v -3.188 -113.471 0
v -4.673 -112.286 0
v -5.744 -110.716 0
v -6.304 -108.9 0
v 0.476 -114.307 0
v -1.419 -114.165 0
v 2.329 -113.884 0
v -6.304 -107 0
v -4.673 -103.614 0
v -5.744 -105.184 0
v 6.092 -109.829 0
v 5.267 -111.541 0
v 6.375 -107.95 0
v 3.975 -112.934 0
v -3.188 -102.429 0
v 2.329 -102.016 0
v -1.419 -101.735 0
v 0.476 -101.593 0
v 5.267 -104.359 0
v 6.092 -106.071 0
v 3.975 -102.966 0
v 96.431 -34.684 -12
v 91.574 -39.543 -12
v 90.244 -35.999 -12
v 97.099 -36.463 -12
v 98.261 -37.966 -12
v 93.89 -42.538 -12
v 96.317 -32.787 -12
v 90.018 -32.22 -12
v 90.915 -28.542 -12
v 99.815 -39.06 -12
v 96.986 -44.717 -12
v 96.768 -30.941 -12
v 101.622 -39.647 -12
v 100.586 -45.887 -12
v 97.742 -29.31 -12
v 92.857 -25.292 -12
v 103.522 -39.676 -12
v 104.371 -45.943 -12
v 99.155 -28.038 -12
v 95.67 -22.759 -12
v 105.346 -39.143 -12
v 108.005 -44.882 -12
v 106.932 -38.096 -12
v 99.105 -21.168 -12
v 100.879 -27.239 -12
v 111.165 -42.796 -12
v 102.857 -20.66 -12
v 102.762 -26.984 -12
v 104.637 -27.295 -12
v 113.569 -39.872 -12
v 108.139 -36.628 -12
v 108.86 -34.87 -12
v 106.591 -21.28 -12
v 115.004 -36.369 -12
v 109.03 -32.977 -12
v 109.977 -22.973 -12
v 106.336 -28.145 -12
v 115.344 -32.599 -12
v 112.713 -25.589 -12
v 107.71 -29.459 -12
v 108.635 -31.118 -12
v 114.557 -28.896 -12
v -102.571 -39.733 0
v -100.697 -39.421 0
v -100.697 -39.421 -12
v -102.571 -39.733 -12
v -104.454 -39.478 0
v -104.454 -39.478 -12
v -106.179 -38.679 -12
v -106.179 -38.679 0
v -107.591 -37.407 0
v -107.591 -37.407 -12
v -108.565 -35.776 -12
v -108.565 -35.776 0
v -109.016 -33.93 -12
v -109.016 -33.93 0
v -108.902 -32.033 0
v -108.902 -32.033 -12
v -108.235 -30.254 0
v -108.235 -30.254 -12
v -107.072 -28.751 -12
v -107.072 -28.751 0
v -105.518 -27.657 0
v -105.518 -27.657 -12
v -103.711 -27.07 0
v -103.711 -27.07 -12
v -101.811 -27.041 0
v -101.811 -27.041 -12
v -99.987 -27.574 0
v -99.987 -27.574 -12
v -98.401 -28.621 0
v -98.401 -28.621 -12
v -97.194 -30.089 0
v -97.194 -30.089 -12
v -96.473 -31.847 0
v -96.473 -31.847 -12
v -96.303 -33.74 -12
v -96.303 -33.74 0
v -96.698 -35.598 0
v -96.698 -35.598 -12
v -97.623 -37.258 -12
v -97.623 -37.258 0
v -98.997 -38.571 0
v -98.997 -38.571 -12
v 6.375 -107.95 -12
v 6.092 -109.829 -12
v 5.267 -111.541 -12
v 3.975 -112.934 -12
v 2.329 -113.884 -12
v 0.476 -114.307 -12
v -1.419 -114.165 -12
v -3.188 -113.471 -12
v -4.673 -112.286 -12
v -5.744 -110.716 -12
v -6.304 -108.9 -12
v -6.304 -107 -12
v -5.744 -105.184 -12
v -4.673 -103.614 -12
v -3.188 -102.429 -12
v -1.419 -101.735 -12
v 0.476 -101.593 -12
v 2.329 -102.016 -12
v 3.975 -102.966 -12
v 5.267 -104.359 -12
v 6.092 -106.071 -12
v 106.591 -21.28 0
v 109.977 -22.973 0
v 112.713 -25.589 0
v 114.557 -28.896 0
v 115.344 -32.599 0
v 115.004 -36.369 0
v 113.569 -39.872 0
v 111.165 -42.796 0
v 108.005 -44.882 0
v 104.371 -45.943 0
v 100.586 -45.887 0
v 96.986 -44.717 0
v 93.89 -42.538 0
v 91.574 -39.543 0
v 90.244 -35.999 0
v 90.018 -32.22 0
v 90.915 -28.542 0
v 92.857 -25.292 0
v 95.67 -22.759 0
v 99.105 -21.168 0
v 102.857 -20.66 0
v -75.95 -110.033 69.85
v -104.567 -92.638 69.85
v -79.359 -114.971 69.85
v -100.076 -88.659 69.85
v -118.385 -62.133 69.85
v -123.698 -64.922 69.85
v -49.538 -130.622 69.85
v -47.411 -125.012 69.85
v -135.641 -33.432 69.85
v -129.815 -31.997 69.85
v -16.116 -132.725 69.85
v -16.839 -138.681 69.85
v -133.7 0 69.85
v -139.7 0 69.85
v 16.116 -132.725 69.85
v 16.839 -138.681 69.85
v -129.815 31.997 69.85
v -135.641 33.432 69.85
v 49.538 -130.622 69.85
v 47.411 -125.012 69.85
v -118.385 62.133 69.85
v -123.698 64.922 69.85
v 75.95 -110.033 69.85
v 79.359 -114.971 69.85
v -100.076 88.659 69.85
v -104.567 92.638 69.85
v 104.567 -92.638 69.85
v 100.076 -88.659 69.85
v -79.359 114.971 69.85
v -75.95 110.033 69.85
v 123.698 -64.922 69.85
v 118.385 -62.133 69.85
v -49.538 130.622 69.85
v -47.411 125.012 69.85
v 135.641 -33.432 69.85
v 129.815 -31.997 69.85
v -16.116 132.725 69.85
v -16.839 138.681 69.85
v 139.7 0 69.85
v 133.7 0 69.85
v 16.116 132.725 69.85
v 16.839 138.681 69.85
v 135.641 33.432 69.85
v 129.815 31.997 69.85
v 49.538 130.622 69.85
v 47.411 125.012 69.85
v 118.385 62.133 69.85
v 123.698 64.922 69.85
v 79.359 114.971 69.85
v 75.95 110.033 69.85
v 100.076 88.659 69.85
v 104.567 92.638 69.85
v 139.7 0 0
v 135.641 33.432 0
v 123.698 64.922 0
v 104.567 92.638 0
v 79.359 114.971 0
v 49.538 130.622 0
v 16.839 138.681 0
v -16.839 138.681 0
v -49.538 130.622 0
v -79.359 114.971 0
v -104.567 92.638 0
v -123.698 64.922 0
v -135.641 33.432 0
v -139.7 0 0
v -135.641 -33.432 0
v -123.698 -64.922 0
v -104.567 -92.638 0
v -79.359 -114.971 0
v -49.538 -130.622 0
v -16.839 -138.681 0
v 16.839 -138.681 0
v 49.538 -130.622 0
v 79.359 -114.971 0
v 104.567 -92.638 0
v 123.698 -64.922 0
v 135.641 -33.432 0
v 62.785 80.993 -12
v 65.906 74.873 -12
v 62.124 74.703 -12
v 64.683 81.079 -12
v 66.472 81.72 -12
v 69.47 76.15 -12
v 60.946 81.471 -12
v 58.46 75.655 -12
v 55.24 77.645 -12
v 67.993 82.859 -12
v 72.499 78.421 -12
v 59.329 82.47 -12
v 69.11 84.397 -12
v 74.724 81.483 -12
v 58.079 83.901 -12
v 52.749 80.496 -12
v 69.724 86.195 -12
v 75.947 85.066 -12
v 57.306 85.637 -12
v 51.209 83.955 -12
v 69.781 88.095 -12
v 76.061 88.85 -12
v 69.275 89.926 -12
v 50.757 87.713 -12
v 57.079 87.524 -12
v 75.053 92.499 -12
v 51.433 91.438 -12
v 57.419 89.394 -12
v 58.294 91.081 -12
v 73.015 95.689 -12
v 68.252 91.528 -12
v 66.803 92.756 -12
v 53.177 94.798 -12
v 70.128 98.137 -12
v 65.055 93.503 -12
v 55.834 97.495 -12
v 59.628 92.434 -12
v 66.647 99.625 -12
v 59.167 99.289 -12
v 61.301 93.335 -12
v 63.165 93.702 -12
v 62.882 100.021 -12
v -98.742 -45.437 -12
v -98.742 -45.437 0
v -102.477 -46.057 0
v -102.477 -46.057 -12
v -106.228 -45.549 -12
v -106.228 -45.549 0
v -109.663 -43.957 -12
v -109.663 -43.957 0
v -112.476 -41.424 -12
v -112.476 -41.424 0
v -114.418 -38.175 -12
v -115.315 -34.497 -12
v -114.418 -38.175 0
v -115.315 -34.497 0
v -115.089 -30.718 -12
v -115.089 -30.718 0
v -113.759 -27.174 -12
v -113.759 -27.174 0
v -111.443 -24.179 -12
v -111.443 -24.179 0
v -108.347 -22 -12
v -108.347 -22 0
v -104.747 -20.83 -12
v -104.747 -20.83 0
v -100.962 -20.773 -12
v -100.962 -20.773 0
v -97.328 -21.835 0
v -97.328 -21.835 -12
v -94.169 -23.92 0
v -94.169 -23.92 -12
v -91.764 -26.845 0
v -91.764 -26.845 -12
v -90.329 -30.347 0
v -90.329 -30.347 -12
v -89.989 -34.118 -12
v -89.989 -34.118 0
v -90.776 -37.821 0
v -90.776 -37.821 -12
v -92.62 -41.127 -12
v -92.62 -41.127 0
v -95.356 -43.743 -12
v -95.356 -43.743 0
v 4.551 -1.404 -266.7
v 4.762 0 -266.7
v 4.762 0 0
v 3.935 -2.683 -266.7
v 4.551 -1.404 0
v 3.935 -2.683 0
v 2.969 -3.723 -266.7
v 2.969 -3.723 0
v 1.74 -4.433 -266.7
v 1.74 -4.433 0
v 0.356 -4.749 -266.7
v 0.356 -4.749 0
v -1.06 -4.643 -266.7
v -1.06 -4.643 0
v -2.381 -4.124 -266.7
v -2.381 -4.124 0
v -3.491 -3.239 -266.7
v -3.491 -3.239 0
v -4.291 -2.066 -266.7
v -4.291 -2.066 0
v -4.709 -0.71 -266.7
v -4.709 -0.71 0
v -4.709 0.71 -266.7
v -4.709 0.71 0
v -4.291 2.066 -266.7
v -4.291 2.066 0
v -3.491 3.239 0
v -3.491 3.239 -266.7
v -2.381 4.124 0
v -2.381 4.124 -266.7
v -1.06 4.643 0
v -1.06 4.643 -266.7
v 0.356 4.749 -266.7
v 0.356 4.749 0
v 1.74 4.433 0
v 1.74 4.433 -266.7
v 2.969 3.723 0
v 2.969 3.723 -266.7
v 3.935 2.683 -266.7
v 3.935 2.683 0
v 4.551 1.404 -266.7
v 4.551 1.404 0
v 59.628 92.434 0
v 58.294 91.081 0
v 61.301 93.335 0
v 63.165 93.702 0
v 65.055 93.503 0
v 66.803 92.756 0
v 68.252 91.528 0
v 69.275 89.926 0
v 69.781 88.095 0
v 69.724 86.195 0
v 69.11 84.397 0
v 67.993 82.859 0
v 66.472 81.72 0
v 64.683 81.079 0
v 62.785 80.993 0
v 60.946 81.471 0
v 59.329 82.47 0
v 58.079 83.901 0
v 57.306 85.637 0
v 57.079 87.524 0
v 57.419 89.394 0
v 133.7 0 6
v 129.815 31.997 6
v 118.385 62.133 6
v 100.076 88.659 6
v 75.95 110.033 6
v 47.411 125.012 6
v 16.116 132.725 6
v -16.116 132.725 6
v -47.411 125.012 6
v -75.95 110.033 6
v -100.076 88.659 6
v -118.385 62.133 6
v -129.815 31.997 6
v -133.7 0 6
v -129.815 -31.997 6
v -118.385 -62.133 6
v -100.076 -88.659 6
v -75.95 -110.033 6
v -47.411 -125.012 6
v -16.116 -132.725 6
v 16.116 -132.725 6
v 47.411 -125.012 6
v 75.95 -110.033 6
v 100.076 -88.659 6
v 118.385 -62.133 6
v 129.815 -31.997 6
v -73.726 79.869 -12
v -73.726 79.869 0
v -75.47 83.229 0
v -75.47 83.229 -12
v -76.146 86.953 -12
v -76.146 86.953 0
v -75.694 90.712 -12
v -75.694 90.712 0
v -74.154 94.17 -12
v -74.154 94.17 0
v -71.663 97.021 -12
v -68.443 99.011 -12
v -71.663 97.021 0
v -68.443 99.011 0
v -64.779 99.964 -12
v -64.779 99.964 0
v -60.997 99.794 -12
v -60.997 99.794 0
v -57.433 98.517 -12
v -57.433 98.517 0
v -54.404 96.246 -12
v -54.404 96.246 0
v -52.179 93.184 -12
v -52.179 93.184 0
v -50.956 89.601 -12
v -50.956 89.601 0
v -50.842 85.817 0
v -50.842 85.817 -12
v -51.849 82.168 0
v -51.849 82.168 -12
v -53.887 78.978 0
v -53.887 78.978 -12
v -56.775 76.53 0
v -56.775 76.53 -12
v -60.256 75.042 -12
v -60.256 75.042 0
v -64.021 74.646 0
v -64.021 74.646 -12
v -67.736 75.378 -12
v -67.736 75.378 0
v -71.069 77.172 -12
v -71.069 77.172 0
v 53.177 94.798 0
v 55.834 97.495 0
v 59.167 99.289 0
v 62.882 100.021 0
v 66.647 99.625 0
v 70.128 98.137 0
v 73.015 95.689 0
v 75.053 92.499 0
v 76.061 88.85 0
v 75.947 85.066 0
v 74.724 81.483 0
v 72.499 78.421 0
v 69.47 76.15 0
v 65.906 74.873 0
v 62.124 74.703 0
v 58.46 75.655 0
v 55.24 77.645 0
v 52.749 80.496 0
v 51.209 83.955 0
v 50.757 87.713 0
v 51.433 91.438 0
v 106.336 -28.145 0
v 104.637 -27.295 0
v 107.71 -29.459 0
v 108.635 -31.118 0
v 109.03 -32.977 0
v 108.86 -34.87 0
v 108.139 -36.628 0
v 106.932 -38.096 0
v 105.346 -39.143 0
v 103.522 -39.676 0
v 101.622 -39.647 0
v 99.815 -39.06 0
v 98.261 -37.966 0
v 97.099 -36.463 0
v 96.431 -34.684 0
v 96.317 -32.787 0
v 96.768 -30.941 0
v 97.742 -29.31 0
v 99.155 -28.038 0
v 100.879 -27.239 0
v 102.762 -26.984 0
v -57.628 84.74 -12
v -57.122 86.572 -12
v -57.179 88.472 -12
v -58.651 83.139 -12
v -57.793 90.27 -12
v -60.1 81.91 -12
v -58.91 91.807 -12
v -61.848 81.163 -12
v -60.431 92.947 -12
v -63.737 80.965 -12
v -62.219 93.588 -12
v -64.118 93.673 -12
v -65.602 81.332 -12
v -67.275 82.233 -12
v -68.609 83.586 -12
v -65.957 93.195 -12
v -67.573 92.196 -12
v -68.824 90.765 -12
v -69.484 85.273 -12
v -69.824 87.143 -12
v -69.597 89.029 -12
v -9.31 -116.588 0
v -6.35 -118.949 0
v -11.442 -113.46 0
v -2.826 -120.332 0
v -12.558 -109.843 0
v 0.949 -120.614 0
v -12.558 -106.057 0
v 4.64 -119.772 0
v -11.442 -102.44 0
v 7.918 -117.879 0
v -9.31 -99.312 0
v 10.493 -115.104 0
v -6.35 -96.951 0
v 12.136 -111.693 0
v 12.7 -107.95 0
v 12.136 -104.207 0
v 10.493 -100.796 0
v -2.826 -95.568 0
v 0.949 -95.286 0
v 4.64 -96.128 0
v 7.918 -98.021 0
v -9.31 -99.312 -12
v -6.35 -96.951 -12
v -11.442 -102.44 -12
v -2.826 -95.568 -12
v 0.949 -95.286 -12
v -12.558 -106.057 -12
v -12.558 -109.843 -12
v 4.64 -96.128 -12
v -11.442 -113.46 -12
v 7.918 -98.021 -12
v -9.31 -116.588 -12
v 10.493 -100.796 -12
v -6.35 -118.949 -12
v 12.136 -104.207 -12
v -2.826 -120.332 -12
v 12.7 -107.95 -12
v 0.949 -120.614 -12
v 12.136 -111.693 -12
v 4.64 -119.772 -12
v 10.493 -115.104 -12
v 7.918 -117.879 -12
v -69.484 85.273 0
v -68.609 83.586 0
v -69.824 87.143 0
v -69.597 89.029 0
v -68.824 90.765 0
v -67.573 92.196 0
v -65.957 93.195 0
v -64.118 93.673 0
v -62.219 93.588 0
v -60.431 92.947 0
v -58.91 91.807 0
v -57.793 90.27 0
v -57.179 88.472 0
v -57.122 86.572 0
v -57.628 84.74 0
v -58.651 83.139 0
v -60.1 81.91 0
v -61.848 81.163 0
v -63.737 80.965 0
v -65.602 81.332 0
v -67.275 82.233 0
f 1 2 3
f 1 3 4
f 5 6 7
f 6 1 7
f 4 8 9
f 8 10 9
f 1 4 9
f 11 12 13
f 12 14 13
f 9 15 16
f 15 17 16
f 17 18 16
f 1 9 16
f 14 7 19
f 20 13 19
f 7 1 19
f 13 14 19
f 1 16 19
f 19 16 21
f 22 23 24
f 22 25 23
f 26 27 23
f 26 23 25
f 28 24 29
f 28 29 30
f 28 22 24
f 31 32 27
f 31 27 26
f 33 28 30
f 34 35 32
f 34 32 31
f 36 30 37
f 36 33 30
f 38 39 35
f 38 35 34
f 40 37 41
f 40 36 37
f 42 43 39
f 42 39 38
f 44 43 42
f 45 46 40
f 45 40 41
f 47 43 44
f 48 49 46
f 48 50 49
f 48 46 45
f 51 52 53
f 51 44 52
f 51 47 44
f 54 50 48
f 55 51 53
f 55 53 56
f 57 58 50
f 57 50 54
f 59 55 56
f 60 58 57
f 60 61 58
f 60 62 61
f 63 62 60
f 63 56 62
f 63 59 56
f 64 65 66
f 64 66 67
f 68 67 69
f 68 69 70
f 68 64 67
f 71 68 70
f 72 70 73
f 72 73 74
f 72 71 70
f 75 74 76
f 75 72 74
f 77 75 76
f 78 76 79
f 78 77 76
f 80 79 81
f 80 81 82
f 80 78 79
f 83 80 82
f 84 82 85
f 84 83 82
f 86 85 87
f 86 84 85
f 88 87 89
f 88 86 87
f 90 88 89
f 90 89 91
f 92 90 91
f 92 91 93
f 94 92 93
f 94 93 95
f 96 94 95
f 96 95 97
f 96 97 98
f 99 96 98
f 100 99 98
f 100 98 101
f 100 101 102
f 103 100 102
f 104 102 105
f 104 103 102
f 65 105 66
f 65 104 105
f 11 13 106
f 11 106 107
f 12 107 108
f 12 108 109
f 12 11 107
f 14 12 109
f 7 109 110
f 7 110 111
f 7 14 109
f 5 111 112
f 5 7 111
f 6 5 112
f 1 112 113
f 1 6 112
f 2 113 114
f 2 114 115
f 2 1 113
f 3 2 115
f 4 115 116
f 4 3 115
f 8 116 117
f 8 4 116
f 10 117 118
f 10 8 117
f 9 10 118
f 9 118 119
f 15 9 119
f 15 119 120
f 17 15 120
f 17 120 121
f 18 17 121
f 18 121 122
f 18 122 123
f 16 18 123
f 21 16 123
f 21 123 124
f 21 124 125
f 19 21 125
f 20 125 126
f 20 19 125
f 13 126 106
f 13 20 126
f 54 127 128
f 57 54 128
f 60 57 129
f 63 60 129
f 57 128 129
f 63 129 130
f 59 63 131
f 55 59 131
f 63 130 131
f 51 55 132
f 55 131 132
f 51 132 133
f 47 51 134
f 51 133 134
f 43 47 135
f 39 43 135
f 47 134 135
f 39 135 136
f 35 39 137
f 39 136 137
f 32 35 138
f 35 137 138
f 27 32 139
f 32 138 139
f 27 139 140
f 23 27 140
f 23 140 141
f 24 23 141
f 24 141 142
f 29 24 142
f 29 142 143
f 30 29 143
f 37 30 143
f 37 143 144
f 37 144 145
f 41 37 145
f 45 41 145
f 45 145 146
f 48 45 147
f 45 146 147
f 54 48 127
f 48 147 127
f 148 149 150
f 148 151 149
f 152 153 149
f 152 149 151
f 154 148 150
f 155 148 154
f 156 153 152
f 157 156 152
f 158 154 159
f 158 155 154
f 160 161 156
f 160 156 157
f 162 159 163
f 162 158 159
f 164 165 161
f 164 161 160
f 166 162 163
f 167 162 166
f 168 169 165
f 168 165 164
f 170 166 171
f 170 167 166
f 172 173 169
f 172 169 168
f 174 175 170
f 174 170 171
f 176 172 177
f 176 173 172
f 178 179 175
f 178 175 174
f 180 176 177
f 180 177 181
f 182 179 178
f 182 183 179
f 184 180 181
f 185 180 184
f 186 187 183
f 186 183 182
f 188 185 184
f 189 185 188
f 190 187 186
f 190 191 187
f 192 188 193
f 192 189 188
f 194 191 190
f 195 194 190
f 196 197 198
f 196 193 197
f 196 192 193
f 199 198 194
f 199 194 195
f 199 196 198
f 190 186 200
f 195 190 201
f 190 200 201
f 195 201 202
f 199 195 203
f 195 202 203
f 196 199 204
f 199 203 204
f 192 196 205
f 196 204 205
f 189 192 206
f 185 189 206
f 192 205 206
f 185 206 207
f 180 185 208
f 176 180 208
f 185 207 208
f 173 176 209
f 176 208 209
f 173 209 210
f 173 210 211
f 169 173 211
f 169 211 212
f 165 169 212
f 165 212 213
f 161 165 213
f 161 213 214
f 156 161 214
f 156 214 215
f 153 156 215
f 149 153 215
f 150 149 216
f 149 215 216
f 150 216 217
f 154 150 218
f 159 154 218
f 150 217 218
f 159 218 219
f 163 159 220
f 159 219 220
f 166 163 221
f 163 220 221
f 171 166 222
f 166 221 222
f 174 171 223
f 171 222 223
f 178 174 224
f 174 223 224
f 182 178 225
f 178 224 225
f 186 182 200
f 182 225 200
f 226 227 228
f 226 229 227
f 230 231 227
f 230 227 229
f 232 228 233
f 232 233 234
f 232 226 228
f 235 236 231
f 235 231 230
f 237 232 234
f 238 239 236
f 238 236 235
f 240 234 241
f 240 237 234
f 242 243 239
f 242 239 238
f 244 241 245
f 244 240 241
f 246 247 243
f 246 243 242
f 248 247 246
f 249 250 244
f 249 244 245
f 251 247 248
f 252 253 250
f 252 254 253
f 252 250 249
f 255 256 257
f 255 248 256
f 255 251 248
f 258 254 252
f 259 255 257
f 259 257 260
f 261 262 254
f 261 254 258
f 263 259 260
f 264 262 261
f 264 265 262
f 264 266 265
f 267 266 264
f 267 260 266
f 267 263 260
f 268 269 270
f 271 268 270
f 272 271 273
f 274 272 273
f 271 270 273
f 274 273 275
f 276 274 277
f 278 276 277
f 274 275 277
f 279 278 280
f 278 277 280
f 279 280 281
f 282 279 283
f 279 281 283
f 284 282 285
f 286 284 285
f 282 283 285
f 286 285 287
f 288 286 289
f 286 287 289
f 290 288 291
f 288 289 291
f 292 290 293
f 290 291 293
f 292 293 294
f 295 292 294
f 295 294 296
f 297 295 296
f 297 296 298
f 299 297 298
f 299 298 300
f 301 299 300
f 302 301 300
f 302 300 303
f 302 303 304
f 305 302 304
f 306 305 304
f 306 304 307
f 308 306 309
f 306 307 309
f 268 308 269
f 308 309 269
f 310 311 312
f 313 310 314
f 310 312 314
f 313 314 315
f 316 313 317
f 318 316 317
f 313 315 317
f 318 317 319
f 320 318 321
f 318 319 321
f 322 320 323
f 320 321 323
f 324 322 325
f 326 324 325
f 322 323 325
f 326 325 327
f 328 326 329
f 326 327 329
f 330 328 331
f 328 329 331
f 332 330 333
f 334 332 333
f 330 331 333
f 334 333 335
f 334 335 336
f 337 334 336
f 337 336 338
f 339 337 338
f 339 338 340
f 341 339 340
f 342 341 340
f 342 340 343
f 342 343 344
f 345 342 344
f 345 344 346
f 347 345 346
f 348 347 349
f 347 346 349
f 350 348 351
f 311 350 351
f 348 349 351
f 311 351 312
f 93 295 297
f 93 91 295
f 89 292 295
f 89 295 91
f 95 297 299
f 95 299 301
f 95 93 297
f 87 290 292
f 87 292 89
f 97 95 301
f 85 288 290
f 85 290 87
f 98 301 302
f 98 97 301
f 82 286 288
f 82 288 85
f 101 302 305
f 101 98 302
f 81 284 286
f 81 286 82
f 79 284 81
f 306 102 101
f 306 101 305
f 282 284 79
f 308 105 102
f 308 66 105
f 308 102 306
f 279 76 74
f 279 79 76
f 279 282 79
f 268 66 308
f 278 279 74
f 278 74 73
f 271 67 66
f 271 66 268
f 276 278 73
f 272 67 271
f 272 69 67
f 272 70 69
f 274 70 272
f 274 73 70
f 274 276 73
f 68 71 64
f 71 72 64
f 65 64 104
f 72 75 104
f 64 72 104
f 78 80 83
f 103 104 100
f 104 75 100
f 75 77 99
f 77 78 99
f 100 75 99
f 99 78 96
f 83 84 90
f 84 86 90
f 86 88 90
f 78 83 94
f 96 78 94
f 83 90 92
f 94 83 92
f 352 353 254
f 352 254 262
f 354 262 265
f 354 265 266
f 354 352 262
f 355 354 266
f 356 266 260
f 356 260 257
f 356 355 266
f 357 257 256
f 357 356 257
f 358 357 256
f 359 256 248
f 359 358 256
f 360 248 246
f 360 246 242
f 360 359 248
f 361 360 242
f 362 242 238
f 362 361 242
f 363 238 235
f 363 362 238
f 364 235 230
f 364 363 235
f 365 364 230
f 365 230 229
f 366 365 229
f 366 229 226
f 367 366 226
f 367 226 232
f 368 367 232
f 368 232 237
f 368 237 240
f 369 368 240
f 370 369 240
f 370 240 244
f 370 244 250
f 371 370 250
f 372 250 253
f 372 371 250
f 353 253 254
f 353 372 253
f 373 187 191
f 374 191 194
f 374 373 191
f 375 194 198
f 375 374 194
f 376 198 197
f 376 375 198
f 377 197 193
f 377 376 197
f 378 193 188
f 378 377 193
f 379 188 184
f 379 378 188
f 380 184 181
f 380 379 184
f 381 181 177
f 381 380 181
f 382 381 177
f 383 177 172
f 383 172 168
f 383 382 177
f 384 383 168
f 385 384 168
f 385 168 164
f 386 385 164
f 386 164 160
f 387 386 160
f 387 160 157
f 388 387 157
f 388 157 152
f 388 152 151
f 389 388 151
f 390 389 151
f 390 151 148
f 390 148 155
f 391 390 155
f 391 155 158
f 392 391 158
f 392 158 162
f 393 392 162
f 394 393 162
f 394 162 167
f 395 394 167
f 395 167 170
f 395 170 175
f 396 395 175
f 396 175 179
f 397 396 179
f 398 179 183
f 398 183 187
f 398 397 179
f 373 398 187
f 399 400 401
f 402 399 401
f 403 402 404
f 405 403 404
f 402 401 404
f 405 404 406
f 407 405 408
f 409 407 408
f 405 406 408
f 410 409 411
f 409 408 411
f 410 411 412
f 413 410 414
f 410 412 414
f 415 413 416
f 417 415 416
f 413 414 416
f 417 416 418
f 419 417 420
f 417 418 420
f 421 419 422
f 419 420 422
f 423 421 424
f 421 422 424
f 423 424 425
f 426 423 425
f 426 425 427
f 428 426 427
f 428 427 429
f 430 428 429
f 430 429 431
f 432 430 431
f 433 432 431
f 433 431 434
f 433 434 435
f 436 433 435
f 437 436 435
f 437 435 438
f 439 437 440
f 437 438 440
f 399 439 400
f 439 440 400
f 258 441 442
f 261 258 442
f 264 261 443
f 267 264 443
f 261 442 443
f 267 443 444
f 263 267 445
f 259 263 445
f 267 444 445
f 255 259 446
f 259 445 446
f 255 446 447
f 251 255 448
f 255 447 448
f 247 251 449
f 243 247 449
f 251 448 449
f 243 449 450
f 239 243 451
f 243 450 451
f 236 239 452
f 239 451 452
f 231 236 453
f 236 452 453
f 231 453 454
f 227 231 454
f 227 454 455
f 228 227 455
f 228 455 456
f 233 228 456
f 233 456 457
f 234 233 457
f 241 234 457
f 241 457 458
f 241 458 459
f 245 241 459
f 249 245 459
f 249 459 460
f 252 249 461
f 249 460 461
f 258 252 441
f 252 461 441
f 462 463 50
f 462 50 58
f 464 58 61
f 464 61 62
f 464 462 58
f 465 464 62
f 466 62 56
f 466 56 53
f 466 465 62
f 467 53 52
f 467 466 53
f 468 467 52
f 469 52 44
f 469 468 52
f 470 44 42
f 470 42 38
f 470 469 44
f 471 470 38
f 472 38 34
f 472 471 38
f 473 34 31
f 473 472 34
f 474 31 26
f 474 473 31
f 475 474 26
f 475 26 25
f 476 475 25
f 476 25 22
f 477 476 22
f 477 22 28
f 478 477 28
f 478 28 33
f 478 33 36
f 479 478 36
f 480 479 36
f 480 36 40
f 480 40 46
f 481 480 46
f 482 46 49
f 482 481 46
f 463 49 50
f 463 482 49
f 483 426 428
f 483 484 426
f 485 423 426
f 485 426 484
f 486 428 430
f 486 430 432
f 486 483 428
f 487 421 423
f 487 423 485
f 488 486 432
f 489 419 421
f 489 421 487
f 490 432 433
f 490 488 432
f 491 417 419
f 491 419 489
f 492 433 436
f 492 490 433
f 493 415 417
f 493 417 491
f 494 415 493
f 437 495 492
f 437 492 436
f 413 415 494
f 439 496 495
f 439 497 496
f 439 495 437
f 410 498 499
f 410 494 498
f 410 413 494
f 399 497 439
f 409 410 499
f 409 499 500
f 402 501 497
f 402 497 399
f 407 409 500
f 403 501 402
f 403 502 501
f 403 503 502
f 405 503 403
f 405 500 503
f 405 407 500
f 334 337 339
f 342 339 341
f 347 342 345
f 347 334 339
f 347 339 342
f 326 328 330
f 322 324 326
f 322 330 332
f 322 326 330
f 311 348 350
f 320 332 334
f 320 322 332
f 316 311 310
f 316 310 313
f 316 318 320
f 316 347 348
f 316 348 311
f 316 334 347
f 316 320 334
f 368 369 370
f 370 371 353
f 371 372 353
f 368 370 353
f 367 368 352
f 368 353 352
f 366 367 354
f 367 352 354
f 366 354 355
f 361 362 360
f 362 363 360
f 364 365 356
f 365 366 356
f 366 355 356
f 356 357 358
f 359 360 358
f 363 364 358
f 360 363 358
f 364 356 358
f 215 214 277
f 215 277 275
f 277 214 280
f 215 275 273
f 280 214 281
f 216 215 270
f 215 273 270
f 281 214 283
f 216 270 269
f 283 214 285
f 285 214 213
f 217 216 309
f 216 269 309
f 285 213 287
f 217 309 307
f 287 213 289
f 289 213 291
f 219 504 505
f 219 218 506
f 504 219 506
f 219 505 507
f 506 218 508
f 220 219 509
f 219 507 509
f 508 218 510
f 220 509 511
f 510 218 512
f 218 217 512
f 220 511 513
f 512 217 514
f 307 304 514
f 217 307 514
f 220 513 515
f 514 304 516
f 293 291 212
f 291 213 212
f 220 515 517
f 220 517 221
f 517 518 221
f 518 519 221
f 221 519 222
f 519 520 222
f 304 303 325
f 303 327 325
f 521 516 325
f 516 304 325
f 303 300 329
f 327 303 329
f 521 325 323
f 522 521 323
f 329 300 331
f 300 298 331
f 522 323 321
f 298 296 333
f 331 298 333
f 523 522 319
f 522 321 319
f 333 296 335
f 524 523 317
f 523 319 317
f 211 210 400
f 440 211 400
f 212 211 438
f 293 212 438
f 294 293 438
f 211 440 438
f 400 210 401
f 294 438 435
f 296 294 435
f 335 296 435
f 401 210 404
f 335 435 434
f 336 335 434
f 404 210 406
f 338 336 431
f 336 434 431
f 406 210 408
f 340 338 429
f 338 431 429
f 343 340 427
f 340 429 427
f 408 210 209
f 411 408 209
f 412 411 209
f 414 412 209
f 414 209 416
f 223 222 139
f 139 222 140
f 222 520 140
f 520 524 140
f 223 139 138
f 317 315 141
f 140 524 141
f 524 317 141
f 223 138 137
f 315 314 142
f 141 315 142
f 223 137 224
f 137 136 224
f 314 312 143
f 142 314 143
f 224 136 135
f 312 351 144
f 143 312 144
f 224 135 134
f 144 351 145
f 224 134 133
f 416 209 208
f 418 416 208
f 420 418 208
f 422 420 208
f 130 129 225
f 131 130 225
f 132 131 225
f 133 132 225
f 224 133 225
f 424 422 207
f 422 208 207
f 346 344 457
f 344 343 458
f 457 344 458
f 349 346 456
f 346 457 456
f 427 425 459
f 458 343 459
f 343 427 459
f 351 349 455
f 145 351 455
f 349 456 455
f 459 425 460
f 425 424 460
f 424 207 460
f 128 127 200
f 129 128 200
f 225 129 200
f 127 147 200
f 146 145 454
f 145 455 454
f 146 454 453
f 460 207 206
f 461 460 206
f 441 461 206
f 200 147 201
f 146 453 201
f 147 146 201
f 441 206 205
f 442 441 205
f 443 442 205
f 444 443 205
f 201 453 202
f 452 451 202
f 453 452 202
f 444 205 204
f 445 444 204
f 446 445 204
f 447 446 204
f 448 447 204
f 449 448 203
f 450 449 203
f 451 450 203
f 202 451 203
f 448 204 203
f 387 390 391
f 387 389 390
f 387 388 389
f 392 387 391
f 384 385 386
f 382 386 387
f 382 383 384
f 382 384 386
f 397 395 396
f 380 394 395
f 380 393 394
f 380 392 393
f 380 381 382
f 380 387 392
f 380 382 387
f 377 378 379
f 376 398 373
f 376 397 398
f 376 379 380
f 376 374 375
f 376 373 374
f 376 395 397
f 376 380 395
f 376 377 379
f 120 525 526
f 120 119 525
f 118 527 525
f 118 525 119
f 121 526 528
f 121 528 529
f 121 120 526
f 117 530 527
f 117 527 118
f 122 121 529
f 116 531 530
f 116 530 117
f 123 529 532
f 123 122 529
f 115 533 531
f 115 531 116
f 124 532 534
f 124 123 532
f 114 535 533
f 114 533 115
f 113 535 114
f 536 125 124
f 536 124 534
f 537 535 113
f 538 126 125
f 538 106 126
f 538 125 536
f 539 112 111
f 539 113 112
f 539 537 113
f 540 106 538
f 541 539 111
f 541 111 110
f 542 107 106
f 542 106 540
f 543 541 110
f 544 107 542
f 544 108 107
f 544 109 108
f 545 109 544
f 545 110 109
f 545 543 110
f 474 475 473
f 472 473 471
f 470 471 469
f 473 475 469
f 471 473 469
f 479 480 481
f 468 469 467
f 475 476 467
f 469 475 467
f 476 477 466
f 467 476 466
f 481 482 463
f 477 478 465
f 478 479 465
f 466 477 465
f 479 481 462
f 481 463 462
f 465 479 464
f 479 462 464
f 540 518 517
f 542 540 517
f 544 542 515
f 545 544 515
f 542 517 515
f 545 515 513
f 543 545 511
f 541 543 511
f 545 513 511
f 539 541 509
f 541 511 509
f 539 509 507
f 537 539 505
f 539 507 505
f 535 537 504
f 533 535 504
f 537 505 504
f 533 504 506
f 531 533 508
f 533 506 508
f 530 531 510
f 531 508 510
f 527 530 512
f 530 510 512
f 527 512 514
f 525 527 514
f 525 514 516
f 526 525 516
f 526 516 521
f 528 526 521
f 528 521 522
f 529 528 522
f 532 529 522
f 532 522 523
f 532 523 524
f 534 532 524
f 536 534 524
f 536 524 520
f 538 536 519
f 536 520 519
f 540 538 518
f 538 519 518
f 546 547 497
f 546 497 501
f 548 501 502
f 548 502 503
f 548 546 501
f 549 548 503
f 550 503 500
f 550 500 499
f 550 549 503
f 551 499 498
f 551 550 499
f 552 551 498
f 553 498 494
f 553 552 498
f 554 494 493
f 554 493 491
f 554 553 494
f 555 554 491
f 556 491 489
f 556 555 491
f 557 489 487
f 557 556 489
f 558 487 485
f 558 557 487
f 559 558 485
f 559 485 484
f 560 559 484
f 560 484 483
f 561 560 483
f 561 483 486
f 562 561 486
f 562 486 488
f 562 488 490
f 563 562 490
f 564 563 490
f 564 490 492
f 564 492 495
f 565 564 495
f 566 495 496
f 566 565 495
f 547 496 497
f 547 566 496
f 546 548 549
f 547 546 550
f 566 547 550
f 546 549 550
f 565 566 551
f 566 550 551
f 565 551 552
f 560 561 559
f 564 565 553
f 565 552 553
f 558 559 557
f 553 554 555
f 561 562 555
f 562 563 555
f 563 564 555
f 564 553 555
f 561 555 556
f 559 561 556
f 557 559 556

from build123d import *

# Parameters (mm, degrees)
F0_R            = 139.7
F1_DEPTH        = 69.85
F2_T            = -6
F3_R            = 12.7
F3_R_2          = 6.375
F4_DEPTH        = 12
F4_COPIES_COUNT = 5
F6_R            = 4.7625
F7_DEPTH        = 266.7


# Not quite as in the source:
# - a pattern or mirror of a feature is missing from the dataset's text; its kind, count and spacing are read off the source's solid


with BuildPart() as f1:
    # F0 (on Top) → F1 (new body)
    with BuildSketch(Plane.XY):
        Circle(F0_R)
    extrude(amount=F1_DEPTH)

    # F2
    f2_openings = [f1.faces().sort_by_distance(p)[0] for p in [
        (0, 0, 69.85),
    ]]
    offset(amount=F2_T, openings=f2_openings)

    # F3 (on face) → F4 (join)
    with BuildSketch(Plane(origin=(0, 0, 0), x_dir=(1, 0, 0), z_dir=(0, 0, -1))):
        with Locations((0, 107.95)):
            Circle(F3_R)
        with Locations((0, 107.95)):
            Circle(F3_R_2, mode=Mode.SUBTRACT)
    f4 = extrude(amount=F4_DEPTH)

    # F4_copies: F4 ×5 about axis
    f4_copies_axis = Axis((0, 0, 0), (0, 0, 1))
    for i in range(1, F4_COPIES_COUNT):
        add(f4.rotate(f4_copies_axis, i * 360 / F4_COPIES_COUNT))

    # F6 (on face) → F7 (join)
    with BuildSketch(Plane(origin=(0, 0, 0), x_dir=(1, 0, 0), z_dir=(0, 0, -1))):
        Circle(F6_R)
    extrude(amount=F7_DEPTH)


solid = f1.part
